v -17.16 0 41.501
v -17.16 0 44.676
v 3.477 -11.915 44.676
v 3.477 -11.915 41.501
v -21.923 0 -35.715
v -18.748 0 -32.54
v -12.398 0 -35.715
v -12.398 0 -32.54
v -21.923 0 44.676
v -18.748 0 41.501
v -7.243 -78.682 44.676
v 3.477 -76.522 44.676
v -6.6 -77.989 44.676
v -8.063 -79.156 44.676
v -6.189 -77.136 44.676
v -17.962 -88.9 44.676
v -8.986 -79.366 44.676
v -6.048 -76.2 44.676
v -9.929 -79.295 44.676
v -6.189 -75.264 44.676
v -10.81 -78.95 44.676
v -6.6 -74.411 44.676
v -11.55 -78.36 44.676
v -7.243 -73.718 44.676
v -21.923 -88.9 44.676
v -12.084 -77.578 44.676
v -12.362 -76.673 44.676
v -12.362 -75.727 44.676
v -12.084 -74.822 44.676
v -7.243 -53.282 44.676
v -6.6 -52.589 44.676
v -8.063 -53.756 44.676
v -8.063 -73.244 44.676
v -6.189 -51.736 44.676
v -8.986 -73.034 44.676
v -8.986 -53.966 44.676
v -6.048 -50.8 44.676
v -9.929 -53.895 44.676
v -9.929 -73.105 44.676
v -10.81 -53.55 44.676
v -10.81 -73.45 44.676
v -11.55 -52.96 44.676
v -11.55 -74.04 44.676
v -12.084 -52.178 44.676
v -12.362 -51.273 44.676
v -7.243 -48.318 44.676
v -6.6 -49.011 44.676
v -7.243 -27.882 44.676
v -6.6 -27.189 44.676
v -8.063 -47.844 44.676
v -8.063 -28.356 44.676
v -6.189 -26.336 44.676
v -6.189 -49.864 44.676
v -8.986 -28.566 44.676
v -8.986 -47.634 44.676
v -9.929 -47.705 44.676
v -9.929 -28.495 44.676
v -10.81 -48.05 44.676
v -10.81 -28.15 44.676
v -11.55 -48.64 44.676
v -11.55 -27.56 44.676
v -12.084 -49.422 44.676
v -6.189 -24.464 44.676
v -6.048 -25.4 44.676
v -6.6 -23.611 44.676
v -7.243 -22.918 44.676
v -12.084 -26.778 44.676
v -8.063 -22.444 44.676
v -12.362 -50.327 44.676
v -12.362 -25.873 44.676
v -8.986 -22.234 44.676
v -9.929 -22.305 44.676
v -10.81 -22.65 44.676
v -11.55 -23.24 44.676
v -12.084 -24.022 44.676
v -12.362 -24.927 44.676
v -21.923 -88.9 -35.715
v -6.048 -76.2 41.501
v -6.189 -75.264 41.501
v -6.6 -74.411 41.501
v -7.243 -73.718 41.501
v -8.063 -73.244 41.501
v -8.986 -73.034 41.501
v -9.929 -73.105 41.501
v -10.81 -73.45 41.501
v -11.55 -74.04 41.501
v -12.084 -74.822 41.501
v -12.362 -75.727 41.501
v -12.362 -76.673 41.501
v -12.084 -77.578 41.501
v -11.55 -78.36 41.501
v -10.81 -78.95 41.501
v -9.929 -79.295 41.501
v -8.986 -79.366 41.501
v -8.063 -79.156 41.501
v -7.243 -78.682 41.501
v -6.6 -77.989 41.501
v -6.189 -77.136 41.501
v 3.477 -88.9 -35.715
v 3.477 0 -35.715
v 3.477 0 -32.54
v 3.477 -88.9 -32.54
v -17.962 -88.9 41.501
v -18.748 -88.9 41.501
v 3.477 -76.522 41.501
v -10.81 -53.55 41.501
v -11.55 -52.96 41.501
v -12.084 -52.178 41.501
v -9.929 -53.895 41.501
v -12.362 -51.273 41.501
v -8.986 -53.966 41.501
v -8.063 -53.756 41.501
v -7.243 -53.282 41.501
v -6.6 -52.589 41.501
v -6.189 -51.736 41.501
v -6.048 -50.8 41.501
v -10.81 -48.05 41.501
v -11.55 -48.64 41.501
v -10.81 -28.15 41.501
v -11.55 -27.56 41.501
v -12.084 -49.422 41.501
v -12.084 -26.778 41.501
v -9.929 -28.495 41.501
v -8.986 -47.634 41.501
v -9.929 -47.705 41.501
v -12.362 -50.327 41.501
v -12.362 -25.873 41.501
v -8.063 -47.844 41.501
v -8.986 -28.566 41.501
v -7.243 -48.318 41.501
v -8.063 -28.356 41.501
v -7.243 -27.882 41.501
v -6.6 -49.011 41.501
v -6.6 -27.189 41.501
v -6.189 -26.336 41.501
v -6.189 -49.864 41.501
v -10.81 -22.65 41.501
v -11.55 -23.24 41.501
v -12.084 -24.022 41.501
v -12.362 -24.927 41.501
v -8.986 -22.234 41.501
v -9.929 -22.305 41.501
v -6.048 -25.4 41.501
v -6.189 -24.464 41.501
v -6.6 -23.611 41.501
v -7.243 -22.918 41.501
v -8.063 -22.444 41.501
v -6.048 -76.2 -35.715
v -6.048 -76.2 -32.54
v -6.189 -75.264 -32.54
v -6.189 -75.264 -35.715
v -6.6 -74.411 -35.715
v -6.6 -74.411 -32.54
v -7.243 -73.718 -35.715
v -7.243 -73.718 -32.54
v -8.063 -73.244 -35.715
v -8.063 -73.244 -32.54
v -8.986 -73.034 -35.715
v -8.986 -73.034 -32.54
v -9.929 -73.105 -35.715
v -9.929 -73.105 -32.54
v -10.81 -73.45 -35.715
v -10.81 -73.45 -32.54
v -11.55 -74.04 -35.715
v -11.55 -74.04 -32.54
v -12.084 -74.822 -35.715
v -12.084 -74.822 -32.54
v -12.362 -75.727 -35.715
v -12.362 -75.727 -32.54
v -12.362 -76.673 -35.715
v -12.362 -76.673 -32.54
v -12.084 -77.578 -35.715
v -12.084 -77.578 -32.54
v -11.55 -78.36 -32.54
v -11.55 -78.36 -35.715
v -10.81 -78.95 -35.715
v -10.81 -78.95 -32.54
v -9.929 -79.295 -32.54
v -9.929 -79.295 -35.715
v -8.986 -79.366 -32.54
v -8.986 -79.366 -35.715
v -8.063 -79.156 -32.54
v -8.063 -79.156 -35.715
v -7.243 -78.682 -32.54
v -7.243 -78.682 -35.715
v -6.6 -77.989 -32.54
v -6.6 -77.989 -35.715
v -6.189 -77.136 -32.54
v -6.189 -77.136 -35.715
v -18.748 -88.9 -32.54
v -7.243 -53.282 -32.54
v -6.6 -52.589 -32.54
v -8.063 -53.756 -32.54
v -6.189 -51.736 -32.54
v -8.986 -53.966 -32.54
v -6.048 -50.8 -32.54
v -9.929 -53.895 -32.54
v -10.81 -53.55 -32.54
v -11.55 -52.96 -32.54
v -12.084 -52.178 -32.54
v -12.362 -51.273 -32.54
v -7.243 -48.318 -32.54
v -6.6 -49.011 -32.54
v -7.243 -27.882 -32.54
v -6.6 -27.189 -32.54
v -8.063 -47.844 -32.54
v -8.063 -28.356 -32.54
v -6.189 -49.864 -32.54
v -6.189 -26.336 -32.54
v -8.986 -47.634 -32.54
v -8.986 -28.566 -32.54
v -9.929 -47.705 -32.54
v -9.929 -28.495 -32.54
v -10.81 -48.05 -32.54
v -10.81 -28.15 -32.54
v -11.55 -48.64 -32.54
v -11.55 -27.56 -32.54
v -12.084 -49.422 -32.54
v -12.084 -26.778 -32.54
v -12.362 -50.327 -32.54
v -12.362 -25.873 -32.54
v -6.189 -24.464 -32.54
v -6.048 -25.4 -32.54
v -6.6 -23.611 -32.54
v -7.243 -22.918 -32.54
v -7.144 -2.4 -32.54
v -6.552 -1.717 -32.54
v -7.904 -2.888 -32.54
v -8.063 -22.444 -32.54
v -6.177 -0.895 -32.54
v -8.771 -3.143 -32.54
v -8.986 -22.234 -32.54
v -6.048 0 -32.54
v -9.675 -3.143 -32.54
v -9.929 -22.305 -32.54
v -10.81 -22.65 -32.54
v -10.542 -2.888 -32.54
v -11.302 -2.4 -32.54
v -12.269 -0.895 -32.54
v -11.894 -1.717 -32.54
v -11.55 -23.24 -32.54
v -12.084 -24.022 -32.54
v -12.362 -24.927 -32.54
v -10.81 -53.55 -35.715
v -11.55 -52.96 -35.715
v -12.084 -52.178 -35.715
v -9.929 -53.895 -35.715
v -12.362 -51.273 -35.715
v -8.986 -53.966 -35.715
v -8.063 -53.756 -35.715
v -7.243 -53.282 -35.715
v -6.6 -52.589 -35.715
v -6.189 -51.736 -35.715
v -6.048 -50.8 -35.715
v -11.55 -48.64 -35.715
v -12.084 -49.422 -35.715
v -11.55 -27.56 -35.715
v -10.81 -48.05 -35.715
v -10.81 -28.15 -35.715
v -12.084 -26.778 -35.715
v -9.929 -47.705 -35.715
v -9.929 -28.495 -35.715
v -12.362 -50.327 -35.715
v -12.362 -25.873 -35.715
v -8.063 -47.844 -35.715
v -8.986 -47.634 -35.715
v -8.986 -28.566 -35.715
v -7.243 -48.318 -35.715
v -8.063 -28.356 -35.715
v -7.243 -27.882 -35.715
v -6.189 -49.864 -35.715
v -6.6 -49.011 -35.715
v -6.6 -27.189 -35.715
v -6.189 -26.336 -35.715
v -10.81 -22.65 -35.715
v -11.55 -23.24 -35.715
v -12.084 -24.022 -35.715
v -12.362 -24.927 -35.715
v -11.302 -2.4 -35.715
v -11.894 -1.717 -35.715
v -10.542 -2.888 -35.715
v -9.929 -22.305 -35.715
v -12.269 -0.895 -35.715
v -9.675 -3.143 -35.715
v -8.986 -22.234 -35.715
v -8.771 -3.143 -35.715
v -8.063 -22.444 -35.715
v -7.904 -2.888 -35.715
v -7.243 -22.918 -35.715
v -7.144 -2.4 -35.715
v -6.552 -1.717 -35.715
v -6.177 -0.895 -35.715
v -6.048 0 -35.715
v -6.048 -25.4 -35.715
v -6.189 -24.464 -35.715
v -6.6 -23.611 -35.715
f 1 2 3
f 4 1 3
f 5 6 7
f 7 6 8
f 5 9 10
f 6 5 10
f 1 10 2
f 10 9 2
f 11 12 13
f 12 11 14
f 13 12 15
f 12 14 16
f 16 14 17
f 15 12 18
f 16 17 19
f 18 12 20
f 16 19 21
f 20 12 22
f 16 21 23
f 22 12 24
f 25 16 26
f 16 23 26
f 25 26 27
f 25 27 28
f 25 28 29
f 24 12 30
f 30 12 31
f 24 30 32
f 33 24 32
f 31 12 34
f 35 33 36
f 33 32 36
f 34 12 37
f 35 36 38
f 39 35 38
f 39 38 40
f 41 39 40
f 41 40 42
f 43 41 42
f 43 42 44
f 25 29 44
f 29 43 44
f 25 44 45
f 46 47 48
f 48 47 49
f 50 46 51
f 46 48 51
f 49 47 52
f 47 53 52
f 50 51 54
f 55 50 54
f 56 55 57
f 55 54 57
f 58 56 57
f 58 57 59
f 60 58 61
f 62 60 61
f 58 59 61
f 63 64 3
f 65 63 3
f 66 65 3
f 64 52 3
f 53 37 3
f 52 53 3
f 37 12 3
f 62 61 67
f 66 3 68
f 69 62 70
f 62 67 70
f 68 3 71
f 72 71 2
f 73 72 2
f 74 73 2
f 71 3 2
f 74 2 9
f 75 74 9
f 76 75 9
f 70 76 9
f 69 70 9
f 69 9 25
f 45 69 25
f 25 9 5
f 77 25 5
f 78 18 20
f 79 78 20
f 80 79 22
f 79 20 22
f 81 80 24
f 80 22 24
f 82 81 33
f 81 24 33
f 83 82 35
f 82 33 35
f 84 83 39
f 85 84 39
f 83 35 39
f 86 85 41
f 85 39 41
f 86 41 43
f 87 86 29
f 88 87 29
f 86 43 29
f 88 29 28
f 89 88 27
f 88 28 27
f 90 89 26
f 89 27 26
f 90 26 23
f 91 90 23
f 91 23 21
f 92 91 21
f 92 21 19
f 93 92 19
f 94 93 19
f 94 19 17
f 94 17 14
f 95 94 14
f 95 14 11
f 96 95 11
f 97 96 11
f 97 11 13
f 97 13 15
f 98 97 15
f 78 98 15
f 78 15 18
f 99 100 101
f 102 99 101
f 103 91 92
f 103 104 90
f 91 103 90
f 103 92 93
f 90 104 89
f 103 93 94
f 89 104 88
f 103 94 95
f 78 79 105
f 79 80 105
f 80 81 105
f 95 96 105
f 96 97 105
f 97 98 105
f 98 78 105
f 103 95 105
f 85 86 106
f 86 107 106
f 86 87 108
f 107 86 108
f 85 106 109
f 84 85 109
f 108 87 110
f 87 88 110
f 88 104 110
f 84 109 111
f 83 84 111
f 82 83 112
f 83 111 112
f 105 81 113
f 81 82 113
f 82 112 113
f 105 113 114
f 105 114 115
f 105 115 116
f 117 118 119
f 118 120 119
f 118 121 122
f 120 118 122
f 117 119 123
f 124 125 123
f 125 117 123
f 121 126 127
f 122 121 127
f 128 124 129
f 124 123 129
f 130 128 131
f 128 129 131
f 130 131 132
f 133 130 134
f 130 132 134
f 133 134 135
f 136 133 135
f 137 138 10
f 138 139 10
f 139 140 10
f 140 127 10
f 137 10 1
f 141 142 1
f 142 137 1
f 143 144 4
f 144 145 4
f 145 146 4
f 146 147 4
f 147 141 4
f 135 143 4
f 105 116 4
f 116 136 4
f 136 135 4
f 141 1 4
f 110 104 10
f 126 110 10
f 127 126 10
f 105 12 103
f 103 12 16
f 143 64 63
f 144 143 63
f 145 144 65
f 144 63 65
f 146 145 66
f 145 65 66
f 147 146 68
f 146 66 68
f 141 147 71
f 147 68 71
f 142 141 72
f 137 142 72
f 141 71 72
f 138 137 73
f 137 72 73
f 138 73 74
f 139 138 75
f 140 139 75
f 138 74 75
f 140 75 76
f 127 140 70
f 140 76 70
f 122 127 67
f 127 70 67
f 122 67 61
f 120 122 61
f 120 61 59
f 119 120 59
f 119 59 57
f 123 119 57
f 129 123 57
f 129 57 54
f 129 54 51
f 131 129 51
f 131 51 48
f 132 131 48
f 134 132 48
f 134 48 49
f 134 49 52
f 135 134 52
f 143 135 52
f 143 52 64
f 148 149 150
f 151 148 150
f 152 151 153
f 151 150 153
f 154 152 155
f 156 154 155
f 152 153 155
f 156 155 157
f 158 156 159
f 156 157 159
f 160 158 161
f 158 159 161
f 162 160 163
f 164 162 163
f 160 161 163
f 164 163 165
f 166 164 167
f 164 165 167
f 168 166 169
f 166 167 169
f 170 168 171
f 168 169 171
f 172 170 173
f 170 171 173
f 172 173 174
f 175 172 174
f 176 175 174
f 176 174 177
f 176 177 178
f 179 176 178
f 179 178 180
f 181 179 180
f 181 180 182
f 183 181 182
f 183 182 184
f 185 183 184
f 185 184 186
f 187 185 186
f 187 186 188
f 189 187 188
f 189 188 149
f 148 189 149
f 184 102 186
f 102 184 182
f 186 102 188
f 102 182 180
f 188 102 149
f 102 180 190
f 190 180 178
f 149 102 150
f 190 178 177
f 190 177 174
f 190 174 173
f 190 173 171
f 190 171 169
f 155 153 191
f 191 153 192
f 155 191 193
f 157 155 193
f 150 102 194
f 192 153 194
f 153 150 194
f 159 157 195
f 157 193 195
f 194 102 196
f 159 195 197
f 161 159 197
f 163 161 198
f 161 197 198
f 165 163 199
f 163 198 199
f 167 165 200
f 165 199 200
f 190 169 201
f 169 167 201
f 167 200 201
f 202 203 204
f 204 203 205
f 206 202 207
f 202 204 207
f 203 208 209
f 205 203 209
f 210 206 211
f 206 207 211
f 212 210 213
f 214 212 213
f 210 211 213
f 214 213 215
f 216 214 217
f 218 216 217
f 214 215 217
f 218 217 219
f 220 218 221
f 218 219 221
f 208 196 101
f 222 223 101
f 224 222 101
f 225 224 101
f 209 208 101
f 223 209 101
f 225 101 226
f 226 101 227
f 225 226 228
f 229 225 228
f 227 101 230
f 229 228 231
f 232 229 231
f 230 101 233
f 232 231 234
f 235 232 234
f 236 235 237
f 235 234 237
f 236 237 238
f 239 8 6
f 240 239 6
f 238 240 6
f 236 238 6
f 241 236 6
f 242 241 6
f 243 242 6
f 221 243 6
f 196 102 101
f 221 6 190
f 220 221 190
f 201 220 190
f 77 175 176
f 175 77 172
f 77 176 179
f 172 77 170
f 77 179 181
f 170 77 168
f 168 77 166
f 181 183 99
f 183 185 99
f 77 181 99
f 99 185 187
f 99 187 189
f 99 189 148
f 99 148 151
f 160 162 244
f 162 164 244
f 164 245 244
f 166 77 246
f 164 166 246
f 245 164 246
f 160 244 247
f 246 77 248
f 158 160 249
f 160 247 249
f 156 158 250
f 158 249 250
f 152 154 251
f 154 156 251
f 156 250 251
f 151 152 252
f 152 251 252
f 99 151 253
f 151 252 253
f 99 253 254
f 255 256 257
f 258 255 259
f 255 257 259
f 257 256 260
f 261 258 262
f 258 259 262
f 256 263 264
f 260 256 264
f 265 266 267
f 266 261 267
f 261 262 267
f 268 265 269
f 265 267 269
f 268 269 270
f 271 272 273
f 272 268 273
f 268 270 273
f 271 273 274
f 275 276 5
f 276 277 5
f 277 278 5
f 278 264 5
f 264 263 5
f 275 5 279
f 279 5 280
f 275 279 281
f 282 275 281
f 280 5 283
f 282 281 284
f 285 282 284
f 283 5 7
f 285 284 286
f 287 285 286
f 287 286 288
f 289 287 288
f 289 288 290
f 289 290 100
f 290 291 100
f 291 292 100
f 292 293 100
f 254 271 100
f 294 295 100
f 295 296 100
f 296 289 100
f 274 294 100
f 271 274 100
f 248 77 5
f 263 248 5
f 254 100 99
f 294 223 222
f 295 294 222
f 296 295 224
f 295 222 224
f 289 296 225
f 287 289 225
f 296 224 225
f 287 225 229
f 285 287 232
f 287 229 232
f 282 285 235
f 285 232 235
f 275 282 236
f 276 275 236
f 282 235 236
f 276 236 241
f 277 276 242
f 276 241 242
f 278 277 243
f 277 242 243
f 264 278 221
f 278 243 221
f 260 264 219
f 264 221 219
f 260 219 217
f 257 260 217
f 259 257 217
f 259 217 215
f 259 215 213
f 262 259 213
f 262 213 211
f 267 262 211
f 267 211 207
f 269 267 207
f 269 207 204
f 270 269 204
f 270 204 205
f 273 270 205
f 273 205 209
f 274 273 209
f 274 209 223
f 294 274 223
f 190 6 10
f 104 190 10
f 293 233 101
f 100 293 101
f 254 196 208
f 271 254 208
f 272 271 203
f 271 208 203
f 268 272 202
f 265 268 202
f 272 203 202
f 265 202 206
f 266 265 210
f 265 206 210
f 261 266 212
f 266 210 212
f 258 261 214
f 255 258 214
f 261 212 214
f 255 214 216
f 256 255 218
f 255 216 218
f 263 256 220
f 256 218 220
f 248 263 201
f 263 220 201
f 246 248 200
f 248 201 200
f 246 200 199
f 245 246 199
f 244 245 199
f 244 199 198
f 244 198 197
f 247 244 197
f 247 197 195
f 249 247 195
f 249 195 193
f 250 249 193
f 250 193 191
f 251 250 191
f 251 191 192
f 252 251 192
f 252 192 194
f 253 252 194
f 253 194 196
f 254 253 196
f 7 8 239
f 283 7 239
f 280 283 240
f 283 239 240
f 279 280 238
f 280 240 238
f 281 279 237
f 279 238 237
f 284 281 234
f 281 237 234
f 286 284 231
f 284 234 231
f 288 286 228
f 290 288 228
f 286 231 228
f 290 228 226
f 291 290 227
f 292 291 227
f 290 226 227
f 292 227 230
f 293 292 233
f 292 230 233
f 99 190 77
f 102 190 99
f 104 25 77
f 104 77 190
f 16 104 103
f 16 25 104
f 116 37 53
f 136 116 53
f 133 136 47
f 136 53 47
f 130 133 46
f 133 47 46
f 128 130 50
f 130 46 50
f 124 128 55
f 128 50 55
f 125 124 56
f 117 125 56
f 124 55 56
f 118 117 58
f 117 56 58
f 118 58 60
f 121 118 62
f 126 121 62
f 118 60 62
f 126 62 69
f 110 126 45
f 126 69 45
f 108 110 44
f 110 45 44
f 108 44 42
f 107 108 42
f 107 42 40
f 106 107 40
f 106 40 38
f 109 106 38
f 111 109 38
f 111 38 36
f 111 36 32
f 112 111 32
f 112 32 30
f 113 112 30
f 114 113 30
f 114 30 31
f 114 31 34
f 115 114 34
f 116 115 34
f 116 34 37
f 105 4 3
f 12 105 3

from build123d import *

# Parameters (mm, degrees)
F1_DEPTH = 88.9
F2_R     = 3.175
F3_DEPTH = 101.6
F5_DEPTH = 3.175


with BuildPart() as f1:
    # F0 (on Front) → F1 (new body)
    with BuildSketch(Plane.XZ):
        Polygon((3.47705, 44.675883), (-21.92295, 44.675883), (-21.92295, -35.715117), (3.47705, -35.715117), (3.47705, -32.540117), (-18.74795, -32.540117), (-18.74795, 41.500883), (3.47705, 41.500883), align=None)
    extrude(amount=F1_DEPTH)

    # F2 (on face) → F3 (cut)
    with BuildSketch(Plane.XY.offset(44.675883)):
        with Locations((-9.22295, -76.2)):
            Circle(F2_R)
        with Locations((-9.22295, -50.8)):
            Circle(F2_R)
        with Locations((-9.22295, -25.4)):
            Circle(F2_R)
        with Locations((-9.22295, 0)):
            Circle(F2_R)
        with Locations((-34.62295, -76.2)):
            Circle(F2_R)
        with Locations((-34.62295, -50.8)):
            Circle(F2_R)
        with Locations((-34.62295, -25.4)):
            Circle(F2_R)
        with Locations((-34.62295, 0)):
            Circle(F2_R)
    extrude(amount=-F3_DEPTH, mode=Mode.SUBTRACT)

    # F4 (on face) → F5 (cut)
    with BuildSketch(Plane.XY.offset(44.675883)):
        with BuildLine():
            Line((-17.16045, 0), (3.47705, -11.915066))
            Line((3.47705, -11.915066), (3.47705, 0))
            Line((3.47705, 0), (-6.04795, 0))
            ThreePointArc((-6.04795, 0), (-9.22295, -3.175), (-12.39795, 0))
            Line((-12.39795, 0), (-17.16045, 0))
        make_face()
        Polygon((3.47705, -76.521958), (-17.962348, -88.9), (3.47705, -88.9), align=None)
    extrude(amount=-F5_DEPTH, mode=Mode.SUBTRACT)


solid = f1.part
